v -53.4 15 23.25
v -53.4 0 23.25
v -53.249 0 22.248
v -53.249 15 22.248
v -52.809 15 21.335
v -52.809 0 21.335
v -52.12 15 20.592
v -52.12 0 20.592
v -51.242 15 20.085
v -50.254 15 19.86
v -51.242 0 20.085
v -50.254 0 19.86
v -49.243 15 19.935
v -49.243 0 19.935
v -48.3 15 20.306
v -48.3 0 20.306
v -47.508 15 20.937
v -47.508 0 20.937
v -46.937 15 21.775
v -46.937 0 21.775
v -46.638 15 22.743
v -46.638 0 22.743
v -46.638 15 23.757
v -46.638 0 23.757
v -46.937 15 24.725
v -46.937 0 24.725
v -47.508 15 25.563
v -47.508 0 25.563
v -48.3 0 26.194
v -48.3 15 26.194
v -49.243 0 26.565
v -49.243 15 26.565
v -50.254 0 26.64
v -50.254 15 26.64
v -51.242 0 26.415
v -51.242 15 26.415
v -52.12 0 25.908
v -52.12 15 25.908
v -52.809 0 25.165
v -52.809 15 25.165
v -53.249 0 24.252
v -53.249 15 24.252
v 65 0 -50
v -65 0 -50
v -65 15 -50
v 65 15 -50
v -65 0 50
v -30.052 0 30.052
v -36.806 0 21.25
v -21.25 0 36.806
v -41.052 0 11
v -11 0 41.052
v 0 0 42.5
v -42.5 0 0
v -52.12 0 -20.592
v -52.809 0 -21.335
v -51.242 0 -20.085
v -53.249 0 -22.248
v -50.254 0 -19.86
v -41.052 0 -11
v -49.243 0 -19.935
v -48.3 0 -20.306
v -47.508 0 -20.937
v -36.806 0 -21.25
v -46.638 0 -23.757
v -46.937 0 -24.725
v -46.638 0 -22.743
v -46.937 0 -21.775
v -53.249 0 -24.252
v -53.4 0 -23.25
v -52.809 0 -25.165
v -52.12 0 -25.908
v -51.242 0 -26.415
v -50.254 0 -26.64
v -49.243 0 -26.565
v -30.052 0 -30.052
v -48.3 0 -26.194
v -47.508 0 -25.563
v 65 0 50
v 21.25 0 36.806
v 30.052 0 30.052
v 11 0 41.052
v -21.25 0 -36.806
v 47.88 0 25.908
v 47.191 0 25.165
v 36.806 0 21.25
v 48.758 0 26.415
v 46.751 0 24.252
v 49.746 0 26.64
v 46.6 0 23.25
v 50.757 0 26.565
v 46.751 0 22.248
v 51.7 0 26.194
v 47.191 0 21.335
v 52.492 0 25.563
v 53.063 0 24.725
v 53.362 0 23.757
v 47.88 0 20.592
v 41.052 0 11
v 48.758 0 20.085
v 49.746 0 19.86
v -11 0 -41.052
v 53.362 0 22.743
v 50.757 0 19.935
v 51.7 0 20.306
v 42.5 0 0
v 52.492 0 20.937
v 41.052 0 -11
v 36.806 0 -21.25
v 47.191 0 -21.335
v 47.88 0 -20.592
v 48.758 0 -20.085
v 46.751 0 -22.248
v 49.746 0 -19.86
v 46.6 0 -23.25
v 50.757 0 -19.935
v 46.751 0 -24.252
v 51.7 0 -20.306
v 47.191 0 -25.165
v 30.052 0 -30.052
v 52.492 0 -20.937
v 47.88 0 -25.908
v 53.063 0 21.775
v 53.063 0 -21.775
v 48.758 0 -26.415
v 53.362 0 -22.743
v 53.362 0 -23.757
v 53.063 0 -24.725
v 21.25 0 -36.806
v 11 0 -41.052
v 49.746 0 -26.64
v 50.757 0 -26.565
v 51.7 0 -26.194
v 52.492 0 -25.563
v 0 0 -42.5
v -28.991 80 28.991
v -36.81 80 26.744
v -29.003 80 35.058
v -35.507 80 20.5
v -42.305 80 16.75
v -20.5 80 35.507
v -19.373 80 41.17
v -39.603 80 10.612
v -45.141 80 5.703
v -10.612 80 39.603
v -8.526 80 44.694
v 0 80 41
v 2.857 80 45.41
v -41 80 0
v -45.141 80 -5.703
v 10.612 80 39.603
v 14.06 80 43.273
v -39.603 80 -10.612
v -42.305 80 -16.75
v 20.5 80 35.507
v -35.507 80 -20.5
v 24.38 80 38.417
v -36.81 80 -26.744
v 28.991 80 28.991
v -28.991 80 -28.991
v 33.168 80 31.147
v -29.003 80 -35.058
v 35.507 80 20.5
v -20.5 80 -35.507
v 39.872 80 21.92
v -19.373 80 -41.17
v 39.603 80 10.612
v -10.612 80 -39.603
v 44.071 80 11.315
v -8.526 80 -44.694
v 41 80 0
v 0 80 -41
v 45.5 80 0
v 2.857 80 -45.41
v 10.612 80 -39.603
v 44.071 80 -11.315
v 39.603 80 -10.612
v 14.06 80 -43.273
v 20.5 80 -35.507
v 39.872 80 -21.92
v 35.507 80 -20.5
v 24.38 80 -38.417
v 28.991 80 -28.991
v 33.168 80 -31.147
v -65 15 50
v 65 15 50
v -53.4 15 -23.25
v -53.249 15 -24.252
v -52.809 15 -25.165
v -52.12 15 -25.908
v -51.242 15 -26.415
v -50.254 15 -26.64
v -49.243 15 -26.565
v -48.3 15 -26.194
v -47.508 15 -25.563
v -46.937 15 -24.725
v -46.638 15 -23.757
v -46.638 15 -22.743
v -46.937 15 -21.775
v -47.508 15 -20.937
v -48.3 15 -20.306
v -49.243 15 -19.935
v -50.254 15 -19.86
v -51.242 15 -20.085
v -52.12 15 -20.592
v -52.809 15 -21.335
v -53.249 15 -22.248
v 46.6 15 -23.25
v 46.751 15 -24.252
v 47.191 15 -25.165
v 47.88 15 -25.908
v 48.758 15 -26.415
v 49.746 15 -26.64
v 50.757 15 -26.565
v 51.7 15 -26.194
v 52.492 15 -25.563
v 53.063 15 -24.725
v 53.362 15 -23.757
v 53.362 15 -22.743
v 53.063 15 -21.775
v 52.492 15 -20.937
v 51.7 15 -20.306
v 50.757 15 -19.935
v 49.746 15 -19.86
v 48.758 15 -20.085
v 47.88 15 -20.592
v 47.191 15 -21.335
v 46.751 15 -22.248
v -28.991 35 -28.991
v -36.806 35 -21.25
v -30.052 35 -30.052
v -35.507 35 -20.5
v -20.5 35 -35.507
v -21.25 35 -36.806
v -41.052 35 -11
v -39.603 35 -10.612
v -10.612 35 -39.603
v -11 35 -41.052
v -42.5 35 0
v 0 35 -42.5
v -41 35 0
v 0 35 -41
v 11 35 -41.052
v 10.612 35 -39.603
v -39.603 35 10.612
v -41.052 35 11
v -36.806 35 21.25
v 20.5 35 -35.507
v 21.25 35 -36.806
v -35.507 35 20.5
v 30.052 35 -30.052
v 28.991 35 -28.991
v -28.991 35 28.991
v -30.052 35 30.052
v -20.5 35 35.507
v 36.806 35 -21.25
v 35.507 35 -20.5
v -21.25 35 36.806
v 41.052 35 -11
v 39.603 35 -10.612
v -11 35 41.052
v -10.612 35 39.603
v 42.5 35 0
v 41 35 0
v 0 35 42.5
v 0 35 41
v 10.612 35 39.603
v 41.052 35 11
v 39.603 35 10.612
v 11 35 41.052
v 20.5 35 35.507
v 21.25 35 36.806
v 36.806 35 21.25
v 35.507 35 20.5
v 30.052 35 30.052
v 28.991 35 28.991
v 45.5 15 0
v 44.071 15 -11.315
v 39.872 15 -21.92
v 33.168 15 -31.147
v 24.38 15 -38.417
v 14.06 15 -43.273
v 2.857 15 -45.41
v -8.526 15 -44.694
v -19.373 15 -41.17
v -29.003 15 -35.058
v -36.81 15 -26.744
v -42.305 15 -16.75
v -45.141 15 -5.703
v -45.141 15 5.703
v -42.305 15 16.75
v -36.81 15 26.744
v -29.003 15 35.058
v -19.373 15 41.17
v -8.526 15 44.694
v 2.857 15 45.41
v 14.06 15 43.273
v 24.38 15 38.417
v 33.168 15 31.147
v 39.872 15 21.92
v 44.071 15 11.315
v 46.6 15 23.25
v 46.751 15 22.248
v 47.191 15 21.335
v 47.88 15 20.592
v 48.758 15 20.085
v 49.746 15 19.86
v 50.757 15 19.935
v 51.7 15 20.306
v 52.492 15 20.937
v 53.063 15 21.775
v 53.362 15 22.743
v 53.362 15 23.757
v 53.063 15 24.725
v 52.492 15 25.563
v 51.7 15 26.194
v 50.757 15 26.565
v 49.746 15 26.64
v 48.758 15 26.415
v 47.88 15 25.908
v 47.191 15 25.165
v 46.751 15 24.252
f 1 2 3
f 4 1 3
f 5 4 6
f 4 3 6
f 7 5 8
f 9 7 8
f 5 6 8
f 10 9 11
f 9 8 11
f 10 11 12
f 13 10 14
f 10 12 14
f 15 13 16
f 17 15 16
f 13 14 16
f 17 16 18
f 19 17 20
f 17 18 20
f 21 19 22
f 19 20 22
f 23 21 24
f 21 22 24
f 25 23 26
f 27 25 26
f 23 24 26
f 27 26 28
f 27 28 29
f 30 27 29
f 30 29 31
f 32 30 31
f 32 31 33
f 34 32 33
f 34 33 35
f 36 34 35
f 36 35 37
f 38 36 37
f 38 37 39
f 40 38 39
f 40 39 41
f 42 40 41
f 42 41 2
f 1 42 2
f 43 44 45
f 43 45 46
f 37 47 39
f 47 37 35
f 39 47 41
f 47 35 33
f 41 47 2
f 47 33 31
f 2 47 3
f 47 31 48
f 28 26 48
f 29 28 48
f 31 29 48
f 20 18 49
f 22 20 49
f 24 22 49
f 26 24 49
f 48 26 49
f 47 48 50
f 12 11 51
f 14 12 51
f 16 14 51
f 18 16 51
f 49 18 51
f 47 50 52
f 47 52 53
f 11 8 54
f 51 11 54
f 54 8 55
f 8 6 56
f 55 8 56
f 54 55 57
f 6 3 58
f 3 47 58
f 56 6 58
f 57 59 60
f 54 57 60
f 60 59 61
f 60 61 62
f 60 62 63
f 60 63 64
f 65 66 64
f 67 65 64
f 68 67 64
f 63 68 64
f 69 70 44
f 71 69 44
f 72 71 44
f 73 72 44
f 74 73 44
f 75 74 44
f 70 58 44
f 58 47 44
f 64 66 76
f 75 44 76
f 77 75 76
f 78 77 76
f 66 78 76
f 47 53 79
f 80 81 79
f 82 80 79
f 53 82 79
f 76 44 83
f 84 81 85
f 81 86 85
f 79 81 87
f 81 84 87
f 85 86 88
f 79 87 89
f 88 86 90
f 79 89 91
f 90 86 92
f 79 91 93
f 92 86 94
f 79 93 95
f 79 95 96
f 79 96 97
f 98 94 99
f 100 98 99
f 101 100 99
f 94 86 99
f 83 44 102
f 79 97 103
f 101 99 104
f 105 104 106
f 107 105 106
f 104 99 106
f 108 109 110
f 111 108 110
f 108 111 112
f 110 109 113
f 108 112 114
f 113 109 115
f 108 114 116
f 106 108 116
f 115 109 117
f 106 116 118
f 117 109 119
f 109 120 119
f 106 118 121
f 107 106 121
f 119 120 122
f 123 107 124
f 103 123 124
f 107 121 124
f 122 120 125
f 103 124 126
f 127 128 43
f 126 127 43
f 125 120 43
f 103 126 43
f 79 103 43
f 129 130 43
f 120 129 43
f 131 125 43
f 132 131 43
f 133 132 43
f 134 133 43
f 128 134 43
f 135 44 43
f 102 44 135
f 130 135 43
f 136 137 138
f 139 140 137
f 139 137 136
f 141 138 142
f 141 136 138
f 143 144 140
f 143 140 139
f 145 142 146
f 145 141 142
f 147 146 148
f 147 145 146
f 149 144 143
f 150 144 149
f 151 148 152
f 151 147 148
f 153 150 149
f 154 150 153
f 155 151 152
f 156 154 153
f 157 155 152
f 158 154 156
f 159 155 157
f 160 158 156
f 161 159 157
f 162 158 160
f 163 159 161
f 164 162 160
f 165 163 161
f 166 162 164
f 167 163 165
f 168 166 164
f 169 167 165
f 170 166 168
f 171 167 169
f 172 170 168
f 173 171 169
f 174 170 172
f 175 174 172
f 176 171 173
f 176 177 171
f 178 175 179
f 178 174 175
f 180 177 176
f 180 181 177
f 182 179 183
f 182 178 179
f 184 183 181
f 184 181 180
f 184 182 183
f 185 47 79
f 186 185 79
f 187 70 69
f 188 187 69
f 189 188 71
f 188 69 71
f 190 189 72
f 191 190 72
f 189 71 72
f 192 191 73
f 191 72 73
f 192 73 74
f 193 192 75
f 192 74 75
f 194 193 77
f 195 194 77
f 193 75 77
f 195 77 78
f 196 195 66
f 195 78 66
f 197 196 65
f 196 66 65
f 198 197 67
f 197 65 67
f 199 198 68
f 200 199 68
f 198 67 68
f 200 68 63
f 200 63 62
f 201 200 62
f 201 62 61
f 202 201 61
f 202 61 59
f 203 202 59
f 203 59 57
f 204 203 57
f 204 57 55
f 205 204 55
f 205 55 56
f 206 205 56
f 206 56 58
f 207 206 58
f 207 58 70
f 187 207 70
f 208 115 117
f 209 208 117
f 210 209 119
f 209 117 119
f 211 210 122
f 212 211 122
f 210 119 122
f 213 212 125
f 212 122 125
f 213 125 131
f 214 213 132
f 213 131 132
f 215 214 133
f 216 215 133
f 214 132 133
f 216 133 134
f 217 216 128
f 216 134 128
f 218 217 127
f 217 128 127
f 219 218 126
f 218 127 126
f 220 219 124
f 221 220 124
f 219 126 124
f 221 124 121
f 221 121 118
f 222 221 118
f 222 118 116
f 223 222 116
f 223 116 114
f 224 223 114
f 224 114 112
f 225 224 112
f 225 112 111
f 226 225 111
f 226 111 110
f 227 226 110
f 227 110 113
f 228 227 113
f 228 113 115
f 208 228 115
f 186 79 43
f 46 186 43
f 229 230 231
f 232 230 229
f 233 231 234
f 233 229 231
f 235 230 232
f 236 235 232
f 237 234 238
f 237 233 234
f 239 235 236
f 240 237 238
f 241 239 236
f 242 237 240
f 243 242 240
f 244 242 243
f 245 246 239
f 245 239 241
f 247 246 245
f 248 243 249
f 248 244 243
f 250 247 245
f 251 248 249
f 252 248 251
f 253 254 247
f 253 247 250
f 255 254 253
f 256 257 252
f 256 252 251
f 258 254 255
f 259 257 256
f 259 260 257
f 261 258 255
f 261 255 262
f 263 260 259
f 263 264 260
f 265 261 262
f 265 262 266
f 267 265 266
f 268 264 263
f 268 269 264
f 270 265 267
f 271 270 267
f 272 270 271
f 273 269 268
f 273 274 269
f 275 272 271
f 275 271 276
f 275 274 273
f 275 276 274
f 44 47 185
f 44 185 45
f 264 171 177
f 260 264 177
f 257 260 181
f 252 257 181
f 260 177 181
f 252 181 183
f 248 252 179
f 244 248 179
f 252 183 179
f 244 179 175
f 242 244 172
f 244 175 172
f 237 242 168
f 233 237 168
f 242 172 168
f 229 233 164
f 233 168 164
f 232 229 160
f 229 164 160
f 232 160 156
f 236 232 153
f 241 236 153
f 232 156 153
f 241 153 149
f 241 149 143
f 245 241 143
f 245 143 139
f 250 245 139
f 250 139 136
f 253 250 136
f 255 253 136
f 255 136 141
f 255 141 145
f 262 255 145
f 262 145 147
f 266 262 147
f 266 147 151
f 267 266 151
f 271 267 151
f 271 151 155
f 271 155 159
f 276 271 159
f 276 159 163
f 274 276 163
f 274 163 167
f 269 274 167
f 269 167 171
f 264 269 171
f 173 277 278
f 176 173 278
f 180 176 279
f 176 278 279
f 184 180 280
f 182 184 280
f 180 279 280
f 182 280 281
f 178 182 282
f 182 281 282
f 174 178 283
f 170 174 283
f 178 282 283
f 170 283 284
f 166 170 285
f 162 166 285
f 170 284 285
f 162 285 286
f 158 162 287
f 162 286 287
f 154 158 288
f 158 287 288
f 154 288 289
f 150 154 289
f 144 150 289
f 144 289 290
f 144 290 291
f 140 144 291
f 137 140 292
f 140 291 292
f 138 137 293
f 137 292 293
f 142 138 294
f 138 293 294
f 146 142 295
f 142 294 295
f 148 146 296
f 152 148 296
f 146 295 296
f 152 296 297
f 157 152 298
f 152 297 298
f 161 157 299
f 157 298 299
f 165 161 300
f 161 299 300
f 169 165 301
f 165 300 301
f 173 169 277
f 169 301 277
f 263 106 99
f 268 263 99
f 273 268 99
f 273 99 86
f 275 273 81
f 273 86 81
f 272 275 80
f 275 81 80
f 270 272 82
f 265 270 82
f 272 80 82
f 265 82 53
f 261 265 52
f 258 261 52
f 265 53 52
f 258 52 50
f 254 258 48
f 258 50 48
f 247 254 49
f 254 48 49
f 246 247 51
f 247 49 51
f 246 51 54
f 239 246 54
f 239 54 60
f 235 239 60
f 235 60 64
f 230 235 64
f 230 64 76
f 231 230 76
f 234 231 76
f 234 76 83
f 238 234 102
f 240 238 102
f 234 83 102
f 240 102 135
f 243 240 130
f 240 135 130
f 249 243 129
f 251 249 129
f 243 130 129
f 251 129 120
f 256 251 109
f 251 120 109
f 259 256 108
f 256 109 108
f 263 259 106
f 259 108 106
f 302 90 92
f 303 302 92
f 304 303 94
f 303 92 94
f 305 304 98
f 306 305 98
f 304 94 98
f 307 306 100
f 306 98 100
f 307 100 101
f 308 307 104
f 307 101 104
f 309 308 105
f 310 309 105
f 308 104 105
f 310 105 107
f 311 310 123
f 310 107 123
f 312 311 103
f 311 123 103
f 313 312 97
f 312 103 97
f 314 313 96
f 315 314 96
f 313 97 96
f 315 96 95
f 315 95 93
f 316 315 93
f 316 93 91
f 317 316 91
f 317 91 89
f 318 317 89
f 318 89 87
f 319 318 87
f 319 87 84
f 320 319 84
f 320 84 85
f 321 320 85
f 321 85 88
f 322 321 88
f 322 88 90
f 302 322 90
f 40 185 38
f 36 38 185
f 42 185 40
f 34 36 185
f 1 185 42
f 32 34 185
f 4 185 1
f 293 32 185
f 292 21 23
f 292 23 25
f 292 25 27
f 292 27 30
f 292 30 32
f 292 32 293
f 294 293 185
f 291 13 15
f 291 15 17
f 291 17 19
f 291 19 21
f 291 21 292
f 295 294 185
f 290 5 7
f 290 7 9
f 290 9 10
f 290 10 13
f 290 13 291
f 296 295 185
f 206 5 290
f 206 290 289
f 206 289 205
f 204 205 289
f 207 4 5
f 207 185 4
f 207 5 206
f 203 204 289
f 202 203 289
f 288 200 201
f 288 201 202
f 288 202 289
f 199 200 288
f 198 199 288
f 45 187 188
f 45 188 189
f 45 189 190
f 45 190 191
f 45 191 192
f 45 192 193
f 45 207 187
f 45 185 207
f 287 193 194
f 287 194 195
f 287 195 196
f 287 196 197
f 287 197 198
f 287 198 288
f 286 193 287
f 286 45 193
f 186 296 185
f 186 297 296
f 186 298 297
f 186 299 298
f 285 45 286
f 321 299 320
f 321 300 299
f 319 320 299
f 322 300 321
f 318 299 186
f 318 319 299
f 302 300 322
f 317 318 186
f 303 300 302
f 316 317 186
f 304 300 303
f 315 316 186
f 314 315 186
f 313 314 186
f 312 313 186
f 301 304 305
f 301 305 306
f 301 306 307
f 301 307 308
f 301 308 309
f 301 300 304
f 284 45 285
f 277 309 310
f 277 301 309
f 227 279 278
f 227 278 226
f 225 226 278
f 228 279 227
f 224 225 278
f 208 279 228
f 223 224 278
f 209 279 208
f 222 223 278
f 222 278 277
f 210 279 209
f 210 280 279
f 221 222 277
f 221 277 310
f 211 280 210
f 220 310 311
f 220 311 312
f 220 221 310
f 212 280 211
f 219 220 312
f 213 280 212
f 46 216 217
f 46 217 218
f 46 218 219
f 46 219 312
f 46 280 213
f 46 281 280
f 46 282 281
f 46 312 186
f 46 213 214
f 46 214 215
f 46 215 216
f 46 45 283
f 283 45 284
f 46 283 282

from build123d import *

# Parameters (mm, degrees)
SKETCH1_W             = 130
SKETCH1_H             = 100
BOSS_EXTRUDE1_DEPTH   = 15
SKETCH2_R             = 45.5
BOSS_EXTRUDE2_DEPTH   = 65
SKETCH3_R             = 41
CUT_EXTRUDE1_DEPTH    = 81
SKETCH4_R             = 42.5
CUT_EXTRUDE2_DEPTH    = 35
M8_TAPPED_HOLE1_D     = 6.8
M8_TAPPED_HOLE1_DEPTH = 17.707073895
M8_TAPPED_HOLE1_TIP   = 2.042926105


with BuildPart() as part:
    # Sketch1 → Boss-Extrude1 (new body)
    with BuildSketch(Plane(origin=(0, 0, 0), x_dir=(1, 0, 0), z_dir=(0, 1, 0))):
        Rectangle(SKETCH1_W, SKETCH1_H)
    extrude(amount=BOSS_EXTRUDE1_DEPTH)

    # Sketch2 → Boss-Extrude2 (add)
    with BuildSketch(Plane(origin=(0, 15, 0), x_dir=(1, 0, 0), z_dir=(0, 1, 0))):
        Circle(SKETCH2_R)
    extrude(amount=BOSS_EXTRUDE2_DEPTH)

    # Sketch3 → Cut-Extrude1 (cut, through all)
    with BuildSketch(Plane(origin=(0, 80, 0), x_dir=(1, 0, 0), z_dir=(0, 1, 0))):
        Circle(SKETCH3_R)
    extrude(amount=-CUT_EXTRUDE1_DEPTH, mode=Mode.SUBTRACT)

    # Sketch4 → Cut-Extrude2 (cut)
    with BuildSketch(Plane.XZ):
        Circle(SKETCH4_R)
    extrude(amount=-CUT_EXTRUDE2_DEPTH, mode=Mode.SUBTRACT)

    # M8 Tapped Hole1
    with Locations(Plane(origin=(0, 15, 0), x_dir=(1, 0, 0), z_dir=(0, 1, 0))):
        with Locations((-50, 23.25), (-50, -23.25), (50, -23.25), (50, 23.25)):
            Hole(M8_TAPPED_HOLE1_D / 2, depth=M8_TAPPED_HOLE1_DEPTH)
            with Locations((0, 0, -(M8_TAPPED_HOLE1_DEPTH + M8_TAPPED_HOLE1_TIP / 2))):  # 118° drill point
                Cone(0, M8_TAPPED_HOLE1_D / 2, M8_TAPPED_HOLE1_TIP, mode=Mode.SUBTRACT)


solid = part.part
